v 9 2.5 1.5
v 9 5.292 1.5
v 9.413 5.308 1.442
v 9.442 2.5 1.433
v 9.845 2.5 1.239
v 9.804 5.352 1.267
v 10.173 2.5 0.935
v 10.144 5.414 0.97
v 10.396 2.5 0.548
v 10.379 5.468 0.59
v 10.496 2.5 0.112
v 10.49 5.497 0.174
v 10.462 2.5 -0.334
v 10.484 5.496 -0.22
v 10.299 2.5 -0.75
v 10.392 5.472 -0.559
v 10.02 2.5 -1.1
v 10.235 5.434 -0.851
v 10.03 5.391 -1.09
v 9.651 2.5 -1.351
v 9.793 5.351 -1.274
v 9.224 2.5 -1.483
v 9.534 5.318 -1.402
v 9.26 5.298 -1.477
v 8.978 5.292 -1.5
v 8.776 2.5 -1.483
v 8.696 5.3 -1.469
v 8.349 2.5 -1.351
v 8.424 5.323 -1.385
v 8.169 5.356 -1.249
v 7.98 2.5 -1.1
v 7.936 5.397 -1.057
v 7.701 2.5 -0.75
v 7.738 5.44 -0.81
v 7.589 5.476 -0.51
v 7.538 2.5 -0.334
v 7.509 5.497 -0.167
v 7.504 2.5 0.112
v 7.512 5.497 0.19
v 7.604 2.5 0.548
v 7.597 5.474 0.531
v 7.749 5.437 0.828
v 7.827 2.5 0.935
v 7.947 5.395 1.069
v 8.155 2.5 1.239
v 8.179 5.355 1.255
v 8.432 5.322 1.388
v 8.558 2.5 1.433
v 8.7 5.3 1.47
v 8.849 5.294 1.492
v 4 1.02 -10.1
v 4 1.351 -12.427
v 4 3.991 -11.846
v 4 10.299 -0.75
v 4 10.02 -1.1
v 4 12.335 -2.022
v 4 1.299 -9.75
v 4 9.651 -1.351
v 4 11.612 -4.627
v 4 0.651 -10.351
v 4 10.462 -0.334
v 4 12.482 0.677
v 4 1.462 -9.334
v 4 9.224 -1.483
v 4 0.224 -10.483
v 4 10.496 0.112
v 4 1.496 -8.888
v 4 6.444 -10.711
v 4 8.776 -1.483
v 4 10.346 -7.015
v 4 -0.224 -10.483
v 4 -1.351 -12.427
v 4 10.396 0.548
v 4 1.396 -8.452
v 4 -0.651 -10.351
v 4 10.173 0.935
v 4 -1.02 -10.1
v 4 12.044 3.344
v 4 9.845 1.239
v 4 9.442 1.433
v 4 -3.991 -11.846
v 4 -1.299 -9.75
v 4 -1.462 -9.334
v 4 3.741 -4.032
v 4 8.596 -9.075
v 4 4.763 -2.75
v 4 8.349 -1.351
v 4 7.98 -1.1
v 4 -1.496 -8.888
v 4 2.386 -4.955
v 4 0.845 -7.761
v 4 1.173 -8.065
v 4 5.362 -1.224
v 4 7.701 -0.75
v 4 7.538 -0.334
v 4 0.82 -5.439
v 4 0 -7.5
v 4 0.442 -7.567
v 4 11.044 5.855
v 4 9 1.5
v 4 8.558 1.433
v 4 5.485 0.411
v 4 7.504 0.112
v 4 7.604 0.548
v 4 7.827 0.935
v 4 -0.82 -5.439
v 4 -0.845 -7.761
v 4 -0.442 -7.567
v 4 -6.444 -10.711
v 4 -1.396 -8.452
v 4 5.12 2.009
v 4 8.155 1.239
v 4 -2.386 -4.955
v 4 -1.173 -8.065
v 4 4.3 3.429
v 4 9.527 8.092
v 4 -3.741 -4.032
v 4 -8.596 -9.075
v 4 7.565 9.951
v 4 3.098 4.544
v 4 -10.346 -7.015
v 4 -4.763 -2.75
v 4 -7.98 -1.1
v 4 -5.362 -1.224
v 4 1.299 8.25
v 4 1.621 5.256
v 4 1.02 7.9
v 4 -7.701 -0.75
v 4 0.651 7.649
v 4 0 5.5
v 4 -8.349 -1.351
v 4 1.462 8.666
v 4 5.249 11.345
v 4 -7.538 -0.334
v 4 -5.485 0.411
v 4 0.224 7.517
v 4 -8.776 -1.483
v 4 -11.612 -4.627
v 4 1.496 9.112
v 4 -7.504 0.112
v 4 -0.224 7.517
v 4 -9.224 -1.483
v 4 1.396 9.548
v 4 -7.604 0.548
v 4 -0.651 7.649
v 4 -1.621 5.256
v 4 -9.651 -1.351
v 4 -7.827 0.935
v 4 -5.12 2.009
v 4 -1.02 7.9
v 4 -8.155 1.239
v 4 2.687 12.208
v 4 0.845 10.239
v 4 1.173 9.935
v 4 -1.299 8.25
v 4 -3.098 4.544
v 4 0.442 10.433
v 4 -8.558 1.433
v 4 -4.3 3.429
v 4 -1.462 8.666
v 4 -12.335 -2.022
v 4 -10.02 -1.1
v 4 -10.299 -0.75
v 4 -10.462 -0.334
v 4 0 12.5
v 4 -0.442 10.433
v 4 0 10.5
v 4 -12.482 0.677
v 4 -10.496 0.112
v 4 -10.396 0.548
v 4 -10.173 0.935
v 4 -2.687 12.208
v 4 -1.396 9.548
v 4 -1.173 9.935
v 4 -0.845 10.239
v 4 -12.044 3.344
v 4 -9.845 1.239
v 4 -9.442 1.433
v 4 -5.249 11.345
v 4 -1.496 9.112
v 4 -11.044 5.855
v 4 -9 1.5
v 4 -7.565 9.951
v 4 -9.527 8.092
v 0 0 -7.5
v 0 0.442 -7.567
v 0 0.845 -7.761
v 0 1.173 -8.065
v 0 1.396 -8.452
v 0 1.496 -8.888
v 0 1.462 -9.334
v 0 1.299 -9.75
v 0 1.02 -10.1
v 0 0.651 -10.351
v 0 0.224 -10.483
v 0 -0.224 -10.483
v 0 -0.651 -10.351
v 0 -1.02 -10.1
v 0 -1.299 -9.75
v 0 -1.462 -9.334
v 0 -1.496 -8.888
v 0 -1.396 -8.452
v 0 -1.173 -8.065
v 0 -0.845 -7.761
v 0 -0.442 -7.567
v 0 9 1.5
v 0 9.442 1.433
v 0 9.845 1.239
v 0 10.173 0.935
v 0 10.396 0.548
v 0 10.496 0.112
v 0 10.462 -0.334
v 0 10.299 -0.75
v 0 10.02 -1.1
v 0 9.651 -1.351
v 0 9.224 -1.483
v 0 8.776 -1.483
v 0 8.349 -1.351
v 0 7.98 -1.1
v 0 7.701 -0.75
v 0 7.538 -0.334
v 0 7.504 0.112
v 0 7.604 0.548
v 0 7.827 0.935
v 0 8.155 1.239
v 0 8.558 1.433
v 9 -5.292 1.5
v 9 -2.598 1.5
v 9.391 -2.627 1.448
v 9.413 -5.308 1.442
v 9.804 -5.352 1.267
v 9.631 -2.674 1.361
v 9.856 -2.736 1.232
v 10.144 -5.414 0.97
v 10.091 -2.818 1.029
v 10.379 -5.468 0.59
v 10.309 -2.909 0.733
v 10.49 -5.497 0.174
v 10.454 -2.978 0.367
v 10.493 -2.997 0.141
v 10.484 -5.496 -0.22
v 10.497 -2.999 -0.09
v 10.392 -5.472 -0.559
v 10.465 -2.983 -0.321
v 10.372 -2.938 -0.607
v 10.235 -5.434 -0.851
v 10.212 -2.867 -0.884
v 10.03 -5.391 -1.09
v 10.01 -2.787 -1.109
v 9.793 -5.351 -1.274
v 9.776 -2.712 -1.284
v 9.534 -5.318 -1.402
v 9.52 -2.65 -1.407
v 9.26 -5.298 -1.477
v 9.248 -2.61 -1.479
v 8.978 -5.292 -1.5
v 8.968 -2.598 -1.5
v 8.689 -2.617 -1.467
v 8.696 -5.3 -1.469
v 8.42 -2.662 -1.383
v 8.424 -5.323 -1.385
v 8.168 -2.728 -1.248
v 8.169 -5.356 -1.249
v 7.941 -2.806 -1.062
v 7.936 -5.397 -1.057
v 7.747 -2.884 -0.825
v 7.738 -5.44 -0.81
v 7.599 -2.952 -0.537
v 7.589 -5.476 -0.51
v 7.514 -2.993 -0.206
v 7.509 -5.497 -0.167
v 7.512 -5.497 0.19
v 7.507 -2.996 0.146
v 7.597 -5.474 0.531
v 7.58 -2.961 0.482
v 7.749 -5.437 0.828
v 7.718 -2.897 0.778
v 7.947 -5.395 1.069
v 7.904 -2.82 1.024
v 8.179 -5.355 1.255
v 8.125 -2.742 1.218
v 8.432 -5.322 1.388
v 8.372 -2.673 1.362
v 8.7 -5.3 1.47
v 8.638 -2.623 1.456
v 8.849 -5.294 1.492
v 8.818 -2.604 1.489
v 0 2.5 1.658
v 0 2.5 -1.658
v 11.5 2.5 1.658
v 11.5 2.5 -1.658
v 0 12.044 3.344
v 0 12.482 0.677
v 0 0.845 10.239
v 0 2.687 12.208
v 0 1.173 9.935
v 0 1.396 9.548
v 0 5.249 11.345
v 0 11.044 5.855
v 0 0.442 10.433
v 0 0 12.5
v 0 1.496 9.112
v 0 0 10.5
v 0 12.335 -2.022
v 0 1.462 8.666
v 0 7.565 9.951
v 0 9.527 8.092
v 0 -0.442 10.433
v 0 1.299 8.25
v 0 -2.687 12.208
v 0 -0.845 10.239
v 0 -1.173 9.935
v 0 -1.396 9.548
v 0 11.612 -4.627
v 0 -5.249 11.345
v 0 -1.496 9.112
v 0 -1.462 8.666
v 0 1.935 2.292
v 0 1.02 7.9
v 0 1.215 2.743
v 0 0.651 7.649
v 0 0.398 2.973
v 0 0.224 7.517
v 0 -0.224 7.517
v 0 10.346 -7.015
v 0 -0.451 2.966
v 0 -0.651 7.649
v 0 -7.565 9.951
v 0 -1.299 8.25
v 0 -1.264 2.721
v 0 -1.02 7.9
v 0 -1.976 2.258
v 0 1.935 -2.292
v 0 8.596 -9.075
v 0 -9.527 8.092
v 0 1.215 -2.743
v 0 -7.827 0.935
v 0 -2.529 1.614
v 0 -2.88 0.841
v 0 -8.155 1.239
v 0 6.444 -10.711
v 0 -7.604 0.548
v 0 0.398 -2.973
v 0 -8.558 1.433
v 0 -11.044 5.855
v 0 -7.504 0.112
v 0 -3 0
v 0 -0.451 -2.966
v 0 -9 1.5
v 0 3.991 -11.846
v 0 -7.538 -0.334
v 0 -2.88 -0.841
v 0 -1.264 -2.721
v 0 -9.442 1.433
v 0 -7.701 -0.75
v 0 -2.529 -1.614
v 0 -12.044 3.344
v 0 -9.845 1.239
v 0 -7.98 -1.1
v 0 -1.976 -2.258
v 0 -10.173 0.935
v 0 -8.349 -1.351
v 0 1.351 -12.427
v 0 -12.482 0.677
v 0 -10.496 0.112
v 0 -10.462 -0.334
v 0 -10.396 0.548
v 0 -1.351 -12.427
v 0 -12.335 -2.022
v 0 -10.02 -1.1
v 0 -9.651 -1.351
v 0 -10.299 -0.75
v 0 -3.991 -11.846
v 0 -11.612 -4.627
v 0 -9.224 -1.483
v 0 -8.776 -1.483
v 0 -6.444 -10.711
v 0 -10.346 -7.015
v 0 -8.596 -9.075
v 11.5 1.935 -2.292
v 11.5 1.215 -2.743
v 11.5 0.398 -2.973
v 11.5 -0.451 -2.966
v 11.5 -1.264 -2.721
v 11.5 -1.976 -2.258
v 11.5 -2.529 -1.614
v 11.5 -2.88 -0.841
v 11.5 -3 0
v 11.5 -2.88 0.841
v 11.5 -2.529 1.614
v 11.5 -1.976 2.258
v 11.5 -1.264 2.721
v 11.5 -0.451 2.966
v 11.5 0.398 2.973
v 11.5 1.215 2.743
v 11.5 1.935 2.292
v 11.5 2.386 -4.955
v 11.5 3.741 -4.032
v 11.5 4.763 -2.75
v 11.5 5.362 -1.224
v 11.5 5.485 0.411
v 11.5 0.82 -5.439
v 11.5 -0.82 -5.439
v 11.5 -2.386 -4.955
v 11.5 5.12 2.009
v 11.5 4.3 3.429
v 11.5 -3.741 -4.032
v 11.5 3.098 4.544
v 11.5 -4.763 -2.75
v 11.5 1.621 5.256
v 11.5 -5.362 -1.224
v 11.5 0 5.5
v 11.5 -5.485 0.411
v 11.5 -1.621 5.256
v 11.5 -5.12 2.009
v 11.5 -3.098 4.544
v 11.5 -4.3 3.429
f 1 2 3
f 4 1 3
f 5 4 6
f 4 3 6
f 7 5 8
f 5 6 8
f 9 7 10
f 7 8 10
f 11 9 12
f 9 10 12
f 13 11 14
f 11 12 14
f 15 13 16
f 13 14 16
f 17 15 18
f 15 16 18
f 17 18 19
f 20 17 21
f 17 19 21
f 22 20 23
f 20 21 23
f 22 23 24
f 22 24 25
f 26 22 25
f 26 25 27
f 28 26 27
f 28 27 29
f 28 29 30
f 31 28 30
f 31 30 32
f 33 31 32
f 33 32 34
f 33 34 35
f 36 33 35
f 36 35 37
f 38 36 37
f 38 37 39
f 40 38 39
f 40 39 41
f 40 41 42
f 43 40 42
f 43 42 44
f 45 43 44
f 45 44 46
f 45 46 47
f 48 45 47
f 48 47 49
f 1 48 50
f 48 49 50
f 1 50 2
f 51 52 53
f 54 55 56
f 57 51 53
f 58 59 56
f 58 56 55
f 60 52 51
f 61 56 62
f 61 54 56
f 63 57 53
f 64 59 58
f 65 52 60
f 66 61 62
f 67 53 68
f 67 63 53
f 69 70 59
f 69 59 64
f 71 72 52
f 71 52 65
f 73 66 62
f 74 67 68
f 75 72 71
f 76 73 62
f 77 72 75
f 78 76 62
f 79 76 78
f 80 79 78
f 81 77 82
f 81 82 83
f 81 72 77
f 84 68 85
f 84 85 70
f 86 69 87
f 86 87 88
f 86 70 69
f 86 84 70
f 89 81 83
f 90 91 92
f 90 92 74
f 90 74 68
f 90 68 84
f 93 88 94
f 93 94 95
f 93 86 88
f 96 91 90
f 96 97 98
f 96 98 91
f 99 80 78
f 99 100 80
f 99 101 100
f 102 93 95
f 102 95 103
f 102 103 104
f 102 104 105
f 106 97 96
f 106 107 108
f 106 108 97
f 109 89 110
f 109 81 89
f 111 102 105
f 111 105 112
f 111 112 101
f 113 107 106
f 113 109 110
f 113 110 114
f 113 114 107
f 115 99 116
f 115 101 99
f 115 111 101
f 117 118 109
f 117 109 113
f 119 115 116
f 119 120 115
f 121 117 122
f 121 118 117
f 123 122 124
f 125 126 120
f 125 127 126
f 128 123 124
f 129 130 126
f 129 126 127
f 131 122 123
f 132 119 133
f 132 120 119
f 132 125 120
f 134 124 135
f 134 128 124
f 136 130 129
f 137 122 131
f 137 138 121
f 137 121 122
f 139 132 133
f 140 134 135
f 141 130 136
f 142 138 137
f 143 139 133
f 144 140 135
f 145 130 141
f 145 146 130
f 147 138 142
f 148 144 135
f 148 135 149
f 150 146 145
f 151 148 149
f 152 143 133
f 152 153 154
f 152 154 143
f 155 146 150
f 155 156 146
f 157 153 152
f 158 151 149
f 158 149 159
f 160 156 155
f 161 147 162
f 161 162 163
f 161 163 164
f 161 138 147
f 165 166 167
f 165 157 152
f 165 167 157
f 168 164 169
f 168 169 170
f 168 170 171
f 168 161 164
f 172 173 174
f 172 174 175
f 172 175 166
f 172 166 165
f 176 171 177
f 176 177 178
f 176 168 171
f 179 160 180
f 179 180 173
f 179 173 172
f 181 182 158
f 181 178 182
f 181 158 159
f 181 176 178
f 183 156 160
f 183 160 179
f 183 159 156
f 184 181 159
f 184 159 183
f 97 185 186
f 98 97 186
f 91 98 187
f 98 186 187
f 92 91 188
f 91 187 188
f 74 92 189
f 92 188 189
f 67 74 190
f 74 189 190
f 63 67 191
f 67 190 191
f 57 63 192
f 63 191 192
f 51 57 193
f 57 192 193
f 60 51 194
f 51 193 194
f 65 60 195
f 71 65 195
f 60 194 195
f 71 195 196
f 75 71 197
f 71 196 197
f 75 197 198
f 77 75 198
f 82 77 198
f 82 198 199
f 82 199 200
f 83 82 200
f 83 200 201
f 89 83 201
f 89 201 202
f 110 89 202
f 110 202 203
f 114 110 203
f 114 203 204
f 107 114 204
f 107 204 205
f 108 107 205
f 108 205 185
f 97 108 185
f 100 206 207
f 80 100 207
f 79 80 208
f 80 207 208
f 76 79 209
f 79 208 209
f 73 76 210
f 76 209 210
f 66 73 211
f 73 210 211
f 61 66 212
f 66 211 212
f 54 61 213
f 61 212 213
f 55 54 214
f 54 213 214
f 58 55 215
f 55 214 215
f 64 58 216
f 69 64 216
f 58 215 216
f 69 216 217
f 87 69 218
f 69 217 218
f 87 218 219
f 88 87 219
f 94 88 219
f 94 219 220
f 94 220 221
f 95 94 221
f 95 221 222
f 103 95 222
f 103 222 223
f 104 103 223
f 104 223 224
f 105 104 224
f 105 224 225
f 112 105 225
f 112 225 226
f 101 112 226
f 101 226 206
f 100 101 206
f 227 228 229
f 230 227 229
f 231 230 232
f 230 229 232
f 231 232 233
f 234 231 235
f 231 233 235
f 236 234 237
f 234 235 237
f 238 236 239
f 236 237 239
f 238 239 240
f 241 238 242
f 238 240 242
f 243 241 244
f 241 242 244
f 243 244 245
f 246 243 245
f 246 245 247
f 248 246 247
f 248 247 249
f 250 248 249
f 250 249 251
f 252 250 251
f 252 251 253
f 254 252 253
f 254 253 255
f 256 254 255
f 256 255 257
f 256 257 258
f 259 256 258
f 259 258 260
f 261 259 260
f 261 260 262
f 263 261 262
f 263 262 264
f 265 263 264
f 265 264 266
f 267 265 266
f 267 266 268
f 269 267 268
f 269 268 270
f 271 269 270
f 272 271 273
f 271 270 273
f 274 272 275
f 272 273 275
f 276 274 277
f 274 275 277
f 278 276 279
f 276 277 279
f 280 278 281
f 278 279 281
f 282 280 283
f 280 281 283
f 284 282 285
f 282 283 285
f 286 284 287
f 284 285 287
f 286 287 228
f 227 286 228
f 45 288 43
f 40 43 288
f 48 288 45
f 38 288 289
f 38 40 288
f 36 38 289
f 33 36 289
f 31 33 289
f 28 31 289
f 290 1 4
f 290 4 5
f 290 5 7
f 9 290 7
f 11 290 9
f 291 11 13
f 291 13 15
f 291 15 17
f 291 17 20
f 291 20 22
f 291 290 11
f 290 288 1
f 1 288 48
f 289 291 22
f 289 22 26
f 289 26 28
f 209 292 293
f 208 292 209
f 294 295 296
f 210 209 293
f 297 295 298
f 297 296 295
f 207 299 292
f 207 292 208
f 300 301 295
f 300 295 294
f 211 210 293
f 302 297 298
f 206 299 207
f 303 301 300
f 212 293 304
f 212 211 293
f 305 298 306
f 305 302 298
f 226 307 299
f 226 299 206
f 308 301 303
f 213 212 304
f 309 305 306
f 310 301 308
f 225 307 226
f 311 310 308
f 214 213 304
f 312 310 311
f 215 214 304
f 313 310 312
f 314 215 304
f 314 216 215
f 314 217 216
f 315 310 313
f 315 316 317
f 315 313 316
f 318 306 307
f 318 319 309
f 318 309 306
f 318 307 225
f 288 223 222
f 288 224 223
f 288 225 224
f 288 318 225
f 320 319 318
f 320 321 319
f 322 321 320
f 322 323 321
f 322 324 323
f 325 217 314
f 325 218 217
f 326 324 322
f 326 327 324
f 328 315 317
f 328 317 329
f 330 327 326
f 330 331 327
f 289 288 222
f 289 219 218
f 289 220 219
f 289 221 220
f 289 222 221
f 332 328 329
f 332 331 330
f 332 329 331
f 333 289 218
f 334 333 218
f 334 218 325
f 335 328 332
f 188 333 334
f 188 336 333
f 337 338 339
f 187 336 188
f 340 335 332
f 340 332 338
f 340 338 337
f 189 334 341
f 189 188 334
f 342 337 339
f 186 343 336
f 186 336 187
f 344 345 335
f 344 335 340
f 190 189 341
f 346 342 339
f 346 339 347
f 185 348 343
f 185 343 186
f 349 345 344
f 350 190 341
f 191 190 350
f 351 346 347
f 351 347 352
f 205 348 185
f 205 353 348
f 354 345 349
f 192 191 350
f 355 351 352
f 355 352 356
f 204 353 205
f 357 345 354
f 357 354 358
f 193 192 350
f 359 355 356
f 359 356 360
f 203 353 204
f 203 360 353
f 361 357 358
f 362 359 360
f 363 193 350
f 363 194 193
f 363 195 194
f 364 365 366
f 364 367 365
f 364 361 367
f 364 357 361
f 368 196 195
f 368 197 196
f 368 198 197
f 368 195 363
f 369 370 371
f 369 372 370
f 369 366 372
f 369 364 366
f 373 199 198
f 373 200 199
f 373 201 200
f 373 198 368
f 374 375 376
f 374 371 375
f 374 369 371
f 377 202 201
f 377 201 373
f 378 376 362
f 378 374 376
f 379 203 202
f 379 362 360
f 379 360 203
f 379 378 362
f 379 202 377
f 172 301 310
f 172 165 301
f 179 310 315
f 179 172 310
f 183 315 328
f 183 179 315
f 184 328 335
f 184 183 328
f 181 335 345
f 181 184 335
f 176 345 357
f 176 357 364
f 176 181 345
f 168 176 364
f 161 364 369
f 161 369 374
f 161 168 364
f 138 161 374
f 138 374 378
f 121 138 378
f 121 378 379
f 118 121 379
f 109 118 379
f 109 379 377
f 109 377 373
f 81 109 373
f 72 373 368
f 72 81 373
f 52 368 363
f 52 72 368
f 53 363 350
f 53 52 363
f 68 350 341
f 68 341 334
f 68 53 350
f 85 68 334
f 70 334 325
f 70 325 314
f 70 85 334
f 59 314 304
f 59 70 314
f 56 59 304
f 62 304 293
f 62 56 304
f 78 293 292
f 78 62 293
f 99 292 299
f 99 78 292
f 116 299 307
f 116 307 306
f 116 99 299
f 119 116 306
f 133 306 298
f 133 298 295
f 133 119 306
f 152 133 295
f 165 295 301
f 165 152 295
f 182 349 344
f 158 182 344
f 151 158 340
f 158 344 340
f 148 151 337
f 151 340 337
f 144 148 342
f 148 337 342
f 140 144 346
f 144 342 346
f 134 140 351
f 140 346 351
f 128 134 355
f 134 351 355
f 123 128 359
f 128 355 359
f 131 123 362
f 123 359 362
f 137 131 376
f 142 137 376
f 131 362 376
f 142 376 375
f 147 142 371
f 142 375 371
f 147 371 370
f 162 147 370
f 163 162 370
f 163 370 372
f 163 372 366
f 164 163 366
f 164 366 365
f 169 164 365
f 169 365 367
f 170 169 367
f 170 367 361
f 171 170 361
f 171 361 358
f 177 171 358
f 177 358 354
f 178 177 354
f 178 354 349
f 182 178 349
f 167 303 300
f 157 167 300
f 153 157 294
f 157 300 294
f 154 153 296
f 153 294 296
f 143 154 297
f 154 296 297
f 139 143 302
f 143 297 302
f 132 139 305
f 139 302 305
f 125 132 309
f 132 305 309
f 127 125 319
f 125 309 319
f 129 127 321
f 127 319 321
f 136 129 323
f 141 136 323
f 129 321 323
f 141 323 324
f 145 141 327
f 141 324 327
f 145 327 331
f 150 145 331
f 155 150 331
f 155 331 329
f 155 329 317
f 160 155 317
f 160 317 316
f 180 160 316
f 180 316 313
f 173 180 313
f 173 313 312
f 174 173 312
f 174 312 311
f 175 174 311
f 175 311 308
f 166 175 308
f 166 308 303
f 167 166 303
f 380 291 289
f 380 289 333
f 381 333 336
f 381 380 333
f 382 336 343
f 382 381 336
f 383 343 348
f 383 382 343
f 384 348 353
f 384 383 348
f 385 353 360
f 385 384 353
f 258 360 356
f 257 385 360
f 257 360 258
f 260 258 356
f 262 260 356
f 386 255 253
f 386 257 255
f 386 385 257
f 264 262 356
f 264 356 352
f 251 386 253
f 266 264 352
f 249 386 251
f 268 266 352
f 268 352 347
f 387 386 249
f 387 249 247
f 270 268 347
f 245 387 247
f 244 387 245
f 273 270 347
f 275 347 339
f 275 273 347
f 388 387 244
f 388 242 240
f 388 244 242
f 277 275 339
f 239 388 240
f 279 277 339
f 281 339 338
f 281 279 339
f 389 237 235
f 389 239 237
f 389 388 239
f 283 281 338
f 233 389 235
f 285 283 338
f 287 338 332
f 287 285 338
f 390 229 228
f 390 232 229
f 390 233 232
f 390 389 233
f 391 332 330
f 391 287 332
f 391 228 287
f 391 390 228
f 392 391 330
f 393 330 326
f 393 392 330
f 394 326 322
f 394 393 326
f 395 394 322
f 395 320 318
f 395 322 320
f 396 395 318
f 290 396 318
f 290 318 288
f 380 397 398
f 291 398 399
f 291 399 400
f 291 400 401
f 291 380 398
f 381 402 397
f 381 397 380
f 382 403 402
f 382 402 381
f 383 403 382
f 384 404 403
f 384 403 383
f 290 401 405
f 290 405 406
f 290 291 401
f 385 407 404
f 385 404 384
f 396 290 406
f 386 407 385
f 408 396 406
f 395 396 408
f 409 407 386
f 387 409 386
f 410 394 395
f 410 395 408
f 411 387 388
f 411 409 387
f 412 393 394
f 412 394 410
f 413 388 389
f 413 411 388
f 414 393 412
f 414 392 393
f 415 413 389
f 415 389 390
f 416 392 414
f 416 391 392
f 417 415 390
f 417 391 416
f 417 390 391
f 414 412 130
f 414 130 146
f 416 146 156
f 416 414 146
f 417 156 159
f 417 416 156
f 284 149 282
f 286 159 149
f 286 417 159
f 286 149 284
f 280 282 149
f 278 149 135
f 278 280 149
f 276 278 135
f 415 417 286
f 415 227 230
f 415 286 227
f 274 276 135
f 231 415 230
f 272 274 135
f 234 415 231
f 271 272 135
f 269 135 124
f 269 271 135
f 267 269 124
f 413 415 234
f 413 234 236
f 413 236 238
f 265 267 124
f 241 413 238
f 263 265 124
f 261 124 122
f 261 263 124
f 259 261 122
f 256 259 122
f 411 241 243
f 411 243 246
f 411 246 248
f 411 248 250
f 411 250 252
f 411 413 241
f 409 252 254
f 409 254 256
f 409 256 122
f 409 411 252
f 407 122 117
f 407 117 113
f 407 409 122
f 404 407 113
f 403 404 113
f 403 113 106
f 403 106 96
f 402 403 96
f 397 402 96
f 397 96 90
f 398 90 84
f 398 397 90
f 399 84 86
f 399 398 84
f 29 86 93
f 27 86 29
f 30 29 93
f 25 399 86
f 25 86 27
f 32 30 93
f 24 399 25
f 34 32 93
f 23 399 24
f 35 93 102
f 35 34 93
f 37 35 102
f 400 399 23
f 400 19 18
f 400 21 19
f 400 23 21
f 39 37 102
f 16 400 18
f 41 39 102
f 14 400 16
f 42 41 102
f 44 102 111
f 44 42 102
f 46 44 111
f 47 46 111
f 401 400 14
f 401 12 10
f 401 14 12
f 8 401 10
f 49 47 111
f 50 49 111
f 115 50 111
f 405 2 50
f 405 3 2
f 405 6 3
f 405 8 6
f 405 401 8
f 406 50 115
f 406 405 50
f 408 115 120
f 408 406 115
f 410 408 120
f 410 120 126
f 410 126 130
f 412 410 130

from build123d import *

# Parameters (mm, degrees)
CUT_EXTRUDE_1_REACH = 23.089
SKETCH_7_R          = 1.5
CUT_EXTRUDE_2_DEPTH = 16
CUT_EXTRUDE_3_REACH = 23.089
SKETCH_8_R          = 1.5


with BuildPart() as part:
    # 草图4 → 旋转1 (revolve)
    with BuildSketch(Plane.XY, mode=Mode.PRIVATE) as revolve_1_sk:
        Polygon((0, 0), (0, 12.5), (4, 12.5), (4, 5.5), (11.5, 5.5), (11.5, 0), align=None)
    revolve(revolve_1_sk.sketch.rotate(Axis((0, 0, 0), (1, 0, 0)), 90), axis=Axis((0, 0, 0), (1, 0, 0)))

    # 草图5 → 切除-拉伸1 (cut, up to next)
    with BuildSketch(Plane(origin=(11.5, 0, 0), x_dir=(0, 0, -1), z_dir=(1, 0, 0)), mode=Mode.PRIVATE) as cut_extrude_1_sk1:
        with BuildLine():
            Line((-1.658312395, 2.5), (1.658312395, 2.5))
            ThreePointArc((1.658312395, 2.5), (0, -3), (-1.658312395, 2.5))
        make_face()
    cut_extrude_1_tool1 = extrude(cut_extrude_1_sk1.sketch, amount=-CUT_EXTRUDE_1_REACH, mode=Mode.PRIVATE) & part.part
    add(cut_extrude_1_tool1.solids().sort_by_distance((11.5, -0.111984, 0))[0], mode=Mode.SUBTRACT)

    # 草图7 → 切除-拉伸2 (cut)
    with BuildSketch(Plane(origin=(0, 6.5, 0), x_dir=(1, 0, 0), z_dir=(0, 1, 0))):
        with Locations(Location((9, 0, 0), (0, 0, 270))):
            Circle(SKETCH_7_R)
    extrude(amount=-CUT_EXTRUDE_2_DEPTH, mode=Mode.SUBTRACT)

    # 草图8 → 切除-拉伸3 (cut, up to next)
    with BuildSketch(Plane.ZY, mode=Mode.PRIVATE) as cut_extrude_3_sk1:
        with Locations((9, 0)):
            Circle(SKETCH_8_R)
    cut_extrude_3_tool1 = extrude(cut_extrude_3_sk1.sketch, amount=-CUT_EXTRUDE_3_REACH, mode=Mode.PRIVATE) & part.part
    # 草图8 → 切除-拉伸3 (cut, up to next)
    with BuildSketch(Plane.ZY, mode=Mode.PRIVATE) as cut_extrude_3_sk2:
        with Locations((0, -9)):
            Circle(SKETCH_8_R)
    cut_extrude_3_tool2 = extrude(cut_extrude_3_sk2.sketch, amount=-CUT_EXTRUDE_3_REACH, mode=Mode.PRIVATE) & part.part
    # 草图8 → 切除-拉伸3 (cut, up to next)
    with BuildSketch(Plane.ZY, mode=Mode.PRIVATE) as cut_extrude_3_sk3:
        with Locations((-9, 0)):
            Circle(SKETCH_8_R)
    cut_extrude_3_tool3 = extrude(cut_extrude_3_sk3.sketch, amount=-CUT_EXTRUDE_3_REACH, mode=Mode.PRIVATE) & part.part
    # 草图8 → 切除-拉伸3 (cut, up to next)
    with BuildSketch(Plane.ZY, mode=Mode.PRIVATE) as cut_extrude_3_sk4:
        with Locations((0, 9)):
            Circle(SKETCH_8_R)
    cut_extrude_3_tool4 = extrude(cut_extrude_3_sk4.sketch, amount=-CUT_EXTRUDE_3_REACH, mode=Mode.PRIVATE) & part.part
    add(cut_extrude_3_tool1.solids().sort_by_distance((0, 0, 9))[0], mode=Mode.SUBTRACT)
    add(cut_extrude_3_tool2.solids().sort_by_distance((0, -9, 0))[0], mode=Mode.SUBTRACT)
    add(cut_extrude_3_tool3.solids().sort_by_distance((0, 0, -9))[0], mode=Mode.SUBTRACT)
    add(cut_extrude_3_tool4.solids().sort_by_distance((0, 9, 0))[0], mode=Mode.SUBTRACT)


solid = part.part
